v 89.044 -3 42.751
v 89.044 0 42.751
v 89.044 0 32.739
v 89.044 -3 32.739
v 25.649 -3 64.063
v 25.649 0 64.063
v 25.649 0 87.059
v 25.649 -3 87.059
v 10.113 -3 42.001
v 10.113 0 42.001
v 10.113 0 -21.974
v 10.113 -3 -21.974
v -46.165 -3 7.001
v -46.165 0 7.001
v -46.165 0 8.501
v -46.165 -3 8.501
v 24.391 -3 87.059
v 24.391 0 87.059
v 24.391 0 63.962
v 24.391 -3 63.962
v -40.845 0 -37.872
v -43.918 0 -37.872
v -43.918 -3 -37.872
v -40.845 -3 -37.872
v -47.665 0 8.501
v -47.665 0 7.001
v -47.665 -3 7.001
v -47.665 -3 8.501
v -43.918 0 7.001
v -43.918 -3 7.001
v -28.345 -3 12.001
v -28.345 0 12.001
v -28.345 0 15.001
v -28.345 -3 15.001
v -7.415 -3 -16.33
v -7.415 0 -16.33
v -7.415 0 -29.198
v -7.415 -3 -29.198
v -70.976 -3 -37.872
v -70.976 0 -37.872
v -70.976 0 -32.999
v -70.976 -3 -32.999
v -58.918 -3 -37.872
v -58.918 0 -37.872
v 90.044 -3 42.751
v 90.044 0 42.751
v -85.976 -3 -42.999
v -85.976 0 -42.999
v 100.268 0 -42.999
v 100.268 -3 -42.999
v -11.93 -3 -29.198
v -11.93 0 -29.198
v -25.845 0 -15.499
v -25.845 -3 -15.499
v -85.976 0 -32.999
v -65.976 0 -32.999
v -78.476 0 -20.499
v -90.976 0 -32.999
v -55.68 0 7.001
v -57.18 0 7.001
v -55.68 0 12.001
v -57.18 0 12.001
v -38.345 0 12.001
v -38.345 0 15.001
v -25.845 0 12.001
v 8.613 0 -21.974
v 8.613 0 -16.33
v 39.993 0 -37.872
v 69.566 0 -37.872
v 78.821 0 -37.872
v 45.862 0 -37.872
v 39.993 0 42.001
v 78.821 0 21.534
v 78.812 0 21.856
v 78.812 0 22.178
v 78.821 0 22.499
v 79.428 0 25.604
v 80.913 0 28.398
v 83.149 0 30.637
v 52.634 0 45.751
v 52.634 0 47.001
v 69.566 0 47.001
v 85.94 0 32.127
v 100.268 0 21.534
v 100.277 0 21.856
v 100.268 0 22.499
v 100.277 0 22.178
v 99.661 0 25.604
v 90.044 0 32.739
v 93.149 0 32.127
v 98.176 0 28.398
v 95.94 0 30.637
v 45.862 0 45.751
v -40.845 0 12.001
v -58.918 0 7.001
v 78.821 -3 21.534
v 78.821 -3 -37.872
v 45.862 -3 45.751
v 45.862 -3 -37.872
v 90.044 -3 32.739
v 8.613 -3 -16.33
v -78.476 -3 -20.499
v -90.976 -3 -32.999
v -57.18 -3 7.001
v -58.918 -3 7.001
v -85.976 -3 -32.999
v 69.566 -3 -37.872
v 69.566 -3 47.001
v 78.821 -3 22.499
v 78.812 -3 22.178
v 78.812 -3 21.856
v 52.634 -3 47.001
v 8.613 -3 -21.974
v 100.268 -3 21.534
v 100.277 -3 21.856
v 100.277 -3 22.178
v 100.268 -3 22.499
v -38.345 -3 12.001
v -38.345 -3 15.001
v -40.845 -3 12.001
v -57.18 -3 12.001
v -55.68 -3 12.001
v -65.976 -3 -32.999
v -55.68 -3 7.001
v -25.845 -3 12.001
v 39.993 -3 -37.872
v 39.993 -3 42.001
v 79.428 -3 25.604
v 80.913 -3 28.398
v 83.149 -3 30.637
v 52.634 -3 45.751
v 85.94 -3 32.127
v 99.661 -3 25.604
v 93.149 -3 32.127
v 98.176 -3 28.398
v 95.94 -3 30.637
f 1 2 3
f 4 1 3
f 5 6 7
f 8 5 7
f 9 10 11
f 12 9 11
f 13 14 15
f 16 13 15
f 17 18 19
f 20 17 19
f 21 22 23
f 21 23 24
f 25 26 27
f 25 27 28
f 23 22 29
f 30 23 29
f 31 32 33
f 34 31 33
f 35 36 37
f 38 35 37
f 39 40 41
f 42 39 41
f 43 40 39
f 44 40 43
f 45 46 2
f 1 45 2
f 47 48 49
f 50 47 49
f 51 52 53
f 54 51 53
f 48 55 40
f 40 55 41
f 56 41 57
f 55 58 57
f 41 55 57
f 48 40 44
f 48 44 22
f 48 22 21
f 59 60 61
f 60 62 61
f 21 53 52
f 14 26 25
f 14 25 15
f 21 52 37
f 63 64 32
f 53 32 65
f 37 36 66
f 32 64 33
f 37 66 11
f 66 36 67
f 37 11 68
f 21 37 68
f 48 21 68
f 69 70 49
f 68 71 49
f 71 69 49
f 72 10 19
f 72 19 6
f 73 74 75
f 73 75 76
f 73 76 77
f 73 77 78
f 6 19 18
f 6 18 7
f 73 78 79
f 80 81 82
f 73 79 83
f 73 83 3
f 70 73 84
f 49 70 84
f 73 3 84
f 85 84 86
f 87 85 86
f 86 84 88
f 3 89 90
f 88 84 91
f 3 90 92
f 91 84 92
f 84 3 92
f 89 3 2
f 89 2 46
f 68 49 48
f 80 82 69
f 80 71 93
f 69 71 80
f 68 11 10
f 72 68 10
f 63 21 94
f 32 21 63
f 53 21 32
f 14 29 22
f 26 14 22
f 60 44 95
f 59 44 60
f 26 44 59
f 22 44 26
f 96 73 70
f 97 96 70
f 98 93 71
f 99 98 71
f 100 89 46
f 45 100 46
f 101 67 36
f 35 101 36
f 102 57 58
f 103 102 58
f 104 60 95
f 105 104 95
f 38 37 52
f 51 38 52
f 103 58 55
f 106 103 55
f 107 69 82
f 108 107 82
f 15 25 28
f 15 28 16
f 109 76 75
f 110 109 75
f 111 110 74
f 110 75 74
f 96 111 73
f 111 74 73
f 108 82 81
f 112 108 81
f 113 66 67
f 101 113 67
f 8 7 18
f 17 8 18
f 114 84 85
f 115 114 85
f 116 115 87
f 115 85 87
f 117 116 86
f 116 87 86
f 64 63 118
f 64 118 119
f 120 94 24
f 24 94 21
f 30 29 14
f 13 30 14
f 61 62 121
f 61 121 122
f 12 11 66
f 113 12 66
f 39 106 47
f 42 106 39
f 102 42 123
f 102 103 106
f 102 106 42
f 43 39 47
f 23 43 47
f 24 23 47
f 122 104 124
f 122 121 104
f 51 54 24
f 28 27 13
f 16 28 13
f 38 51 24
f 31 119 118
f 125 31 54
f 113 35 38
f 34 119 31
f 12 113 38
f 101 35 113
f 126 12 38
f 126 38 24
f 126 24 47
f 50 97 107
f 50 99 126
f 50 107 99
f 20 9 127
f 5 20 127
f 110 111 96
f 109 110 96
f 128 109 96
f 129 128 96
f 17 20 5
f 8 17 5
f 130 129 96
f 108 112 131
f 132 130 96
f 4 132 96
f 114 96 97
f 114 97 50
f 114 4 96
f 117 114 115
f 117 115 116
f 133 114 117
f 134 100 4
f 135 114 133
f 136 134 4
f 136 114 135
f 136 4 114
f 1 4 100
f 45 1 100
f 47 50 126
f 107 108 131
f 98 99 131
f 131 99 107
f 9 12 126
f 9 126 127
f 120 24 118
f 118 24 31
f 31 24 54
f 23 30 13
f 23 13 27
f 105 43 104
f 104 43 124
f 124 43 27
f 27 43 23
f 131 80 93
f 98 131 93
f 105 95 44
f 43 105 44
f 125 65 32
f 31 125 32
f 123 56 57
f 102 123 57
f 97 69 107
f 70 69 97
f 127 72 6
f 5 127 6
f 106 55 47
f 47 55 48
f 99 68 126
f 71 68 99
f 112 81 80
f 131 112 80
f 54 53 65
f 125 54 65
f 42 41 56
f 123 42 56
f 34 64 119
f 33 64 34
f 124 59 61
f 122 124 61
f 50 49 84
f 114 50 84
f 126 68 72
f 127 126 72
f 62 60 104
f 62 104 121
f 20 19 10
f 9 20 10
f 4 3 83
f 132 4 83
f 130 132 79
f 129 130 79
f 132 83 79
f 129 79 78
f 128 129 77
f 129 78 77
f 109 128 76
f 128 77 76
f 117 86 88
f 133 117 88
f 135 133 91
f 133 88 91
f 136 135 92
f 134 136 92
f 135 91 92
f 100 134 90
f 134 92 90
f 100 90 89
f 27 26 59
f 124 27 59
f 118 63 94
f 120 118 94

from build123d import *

# Parameters (mm, degrees)
F0_W     = 12.0587127507
F0_H     = 5.1275454462
F0_W_2   = 3.073014915
F0_W_3   = 1.5
F0_H_2   = 5
F0_W_4   = 5.8694817126
F0_H_3   = 1.5
F0_W_5   = 10
F0_H_4   = 3
F0_W_6   = 9.2557147145
F1_DEPTH = 3


with BuildPart() as f1:
    # F0 (on Front) → F1 (new body)
    with BuildSketch(Plane.XZ):
        Polygon((-85.9764102697, -32.9992154241), (-85.9764102697, -42.9992154241), (-70.9764102697, -42.9992154241), (-70.9764102697, -37.8716699779), (-70.9764102697, -32.9992154241), (-65.9764102697, -32.9992154241), (-78.4764102697, -20.4992154241), (-90.9764102697, -32.9992154241), align=None)
        with Locations((-64.9470538944, -40.435442701)):
            Rectangle(F0_W, F0_H)
        Polygon((-58.9176975191, -37.8716699779), (-58.9176975191, -42.9992154241), (-43.9176975191, -42.9992154241), (-43.9176975191, -37.8716699779), (-43.9176975191, 7.0007845759), (-46.1646348834, 7.0007845759), (-47.6646348834, 7.0007845759), (-55.679722935, 7.0007845759), (-57.179722935, 7.0007845759), (-58.9176975191, 7.0007845759), align=None)
        with Locations((-42.3811900616, -40.435442701)):
            Rectangle(F0_W_2, F0_H)
        Polygon((-40.8446826041, -37.8716699779), (-40.8446826041, -42.9992154241), (-25.8446826041, -42.9992154241), (-25.8446826041, -15.4992154241), (-25.8446826041, 12.0007845759), (-28.3446826041, 12.0007845759), (-38.3446826041, 12.0007845759), (-40.8446826041, 12.0007845759), align=None)
        Polygon((-25.8446826041, -15.4992154241), (-25.8446826041, -42.9992154241), (39.9925373495, -42.9992154241), (39.9925373495, -37.8716699779), (39.9925373495, 42.0007845759), (25.0529701523, 42.0007845759), (10.1134029552, 42.0007845759), (10.1134029552, -21.9735670835), (8.6134029552, -21.9735670835), (8.6134029552, -16.3298398256), (-7.4147884734, -16.3298398256), (-7.4147884734, -29.1975438595), (-11.9297718629, -29.1975438595), align=None)
        with Locations((-56.429722935, 9.5007845759)):
            Rectangle(F0_W_3, F0_H_2)
        with Locations((42.9272782058, -40.435442701)):
            Rectangle(F0_W_4, F0_H)
        with Locations((-46.9146348834, 7.7507845759)):
            Rectangle(F0_W_3, F0_H_3)
        Polygon((45.862019062, -37.8716699779), (45.862019062, -42.9992154241), (69.5656836033, -42.9992154241), (69.5656836033, -37.8716699779), (69.5656836033, 47.0007845759), (52.6344925165, 47.0007845759), (52.6344925165, 45.7507845759), (45.862019062, 45.7507845759), align=None)
        with Locations((-33.3446826041, 13.5007845759)):
            Rectangle(F0_W_5, F0_H_4)
        with Locations((74.1935409606, -40.435442701)):
            Rectangle(F0_W_6, F0_H)
        Polygon((25.0529701523, 42.0007845759), (39.9925373495, 42.0007845759), (25.6491004298, 64.0628009761), (25.0529701523, 64.979724586), align=None)
        with BuildLine():
            Line((78.8213983178, -37.8716699779), (78.8213983178, -42.9992154241))
            Line((78.8213983178, -42.9992154241), (100.2675741911, -42.9992154241))
            Line((100.2675741911, -42.9992154241), (100.2675741911, 21.5343244148))
            Line((100.2675741911, 21.5343244148), (100.2675741911, 22.4990192801))
            ThreePointArc((100.2675741911, 22.4990192801), (97.140766726, 29.6004569802), (90.0444862545, 32.7389511733))
            ThreePointArc((90.0444862545, 32.7389511733), (89.5444862545, 32.7506028116), (89.0444862545, 32.7389511733))
            ThreePointArc((89.0444862545, 32.7389511733), (81.9482057829, 29.6004569802), (78.8213983178, 22.4990192801))
            Line((78.8213983178, 22.4990192801), (78.8213983178, 21.5343244148))
            Line((78.8213983178, 21.5343244148), (78.8213983178, -37.8716699779))
        make_face()
        Polygon((10.1134029552, 42.0007845759), (25.0529701523, 42.0007845759), (25.0529701523, 64.979724586), (24.3911507636, 63.9617628318), align=None)
        Polygon((25.0529701523, 64.979724586), (25.6491004298, 64.0628009761), (25.6491004298, 87.0592445135), (25.0529701523, 87.0592445135), align=None)
        Polygon((24.3911507636, 63.9617628318), (25.0529701523, 64.979724586), (25.0529701523, 87.0592445135), (24.3911507636, 87.0592445135), align=None)
        with BuildLine():
            Line((100.2675741911, 22.4990192801), (100.2675741911, 21.5343244148))
            ThreePointArc((100.2675741911, 21.5343244148), (100.2784172186, 22.0166718474), (100.2675741911, 22.4990192801))
        make_face()
        with BuildLine():
            ThreePointArc((78.8213983178, 22.4990192801), (78.8105552903, 22.0166718474), (78.8213983178, 21.5343244148))
            Line((78.8213983178, 21.5343244148), (78.8213983178, 22.4990192801))
        make_face()
        with BuildLine():
            ThreePointArc((89.0444862545, 32.7389511733), (89.5444862545, 32.7506028116), (90.0444862545, 32.7389511733))
            Line((90.0444862545, 32.7389511733), (90.0444862545, 42.7506028116))
            Line((90.0444862545, 42.7506028116), (89.0444862545, 42.7506028116))
            Line((89.0444862545, 42.7506028116), (89.0444862545, 32.7389511733))
        make_face()
    extrude(amount=F1_DEPTH)


solid = f1.part
